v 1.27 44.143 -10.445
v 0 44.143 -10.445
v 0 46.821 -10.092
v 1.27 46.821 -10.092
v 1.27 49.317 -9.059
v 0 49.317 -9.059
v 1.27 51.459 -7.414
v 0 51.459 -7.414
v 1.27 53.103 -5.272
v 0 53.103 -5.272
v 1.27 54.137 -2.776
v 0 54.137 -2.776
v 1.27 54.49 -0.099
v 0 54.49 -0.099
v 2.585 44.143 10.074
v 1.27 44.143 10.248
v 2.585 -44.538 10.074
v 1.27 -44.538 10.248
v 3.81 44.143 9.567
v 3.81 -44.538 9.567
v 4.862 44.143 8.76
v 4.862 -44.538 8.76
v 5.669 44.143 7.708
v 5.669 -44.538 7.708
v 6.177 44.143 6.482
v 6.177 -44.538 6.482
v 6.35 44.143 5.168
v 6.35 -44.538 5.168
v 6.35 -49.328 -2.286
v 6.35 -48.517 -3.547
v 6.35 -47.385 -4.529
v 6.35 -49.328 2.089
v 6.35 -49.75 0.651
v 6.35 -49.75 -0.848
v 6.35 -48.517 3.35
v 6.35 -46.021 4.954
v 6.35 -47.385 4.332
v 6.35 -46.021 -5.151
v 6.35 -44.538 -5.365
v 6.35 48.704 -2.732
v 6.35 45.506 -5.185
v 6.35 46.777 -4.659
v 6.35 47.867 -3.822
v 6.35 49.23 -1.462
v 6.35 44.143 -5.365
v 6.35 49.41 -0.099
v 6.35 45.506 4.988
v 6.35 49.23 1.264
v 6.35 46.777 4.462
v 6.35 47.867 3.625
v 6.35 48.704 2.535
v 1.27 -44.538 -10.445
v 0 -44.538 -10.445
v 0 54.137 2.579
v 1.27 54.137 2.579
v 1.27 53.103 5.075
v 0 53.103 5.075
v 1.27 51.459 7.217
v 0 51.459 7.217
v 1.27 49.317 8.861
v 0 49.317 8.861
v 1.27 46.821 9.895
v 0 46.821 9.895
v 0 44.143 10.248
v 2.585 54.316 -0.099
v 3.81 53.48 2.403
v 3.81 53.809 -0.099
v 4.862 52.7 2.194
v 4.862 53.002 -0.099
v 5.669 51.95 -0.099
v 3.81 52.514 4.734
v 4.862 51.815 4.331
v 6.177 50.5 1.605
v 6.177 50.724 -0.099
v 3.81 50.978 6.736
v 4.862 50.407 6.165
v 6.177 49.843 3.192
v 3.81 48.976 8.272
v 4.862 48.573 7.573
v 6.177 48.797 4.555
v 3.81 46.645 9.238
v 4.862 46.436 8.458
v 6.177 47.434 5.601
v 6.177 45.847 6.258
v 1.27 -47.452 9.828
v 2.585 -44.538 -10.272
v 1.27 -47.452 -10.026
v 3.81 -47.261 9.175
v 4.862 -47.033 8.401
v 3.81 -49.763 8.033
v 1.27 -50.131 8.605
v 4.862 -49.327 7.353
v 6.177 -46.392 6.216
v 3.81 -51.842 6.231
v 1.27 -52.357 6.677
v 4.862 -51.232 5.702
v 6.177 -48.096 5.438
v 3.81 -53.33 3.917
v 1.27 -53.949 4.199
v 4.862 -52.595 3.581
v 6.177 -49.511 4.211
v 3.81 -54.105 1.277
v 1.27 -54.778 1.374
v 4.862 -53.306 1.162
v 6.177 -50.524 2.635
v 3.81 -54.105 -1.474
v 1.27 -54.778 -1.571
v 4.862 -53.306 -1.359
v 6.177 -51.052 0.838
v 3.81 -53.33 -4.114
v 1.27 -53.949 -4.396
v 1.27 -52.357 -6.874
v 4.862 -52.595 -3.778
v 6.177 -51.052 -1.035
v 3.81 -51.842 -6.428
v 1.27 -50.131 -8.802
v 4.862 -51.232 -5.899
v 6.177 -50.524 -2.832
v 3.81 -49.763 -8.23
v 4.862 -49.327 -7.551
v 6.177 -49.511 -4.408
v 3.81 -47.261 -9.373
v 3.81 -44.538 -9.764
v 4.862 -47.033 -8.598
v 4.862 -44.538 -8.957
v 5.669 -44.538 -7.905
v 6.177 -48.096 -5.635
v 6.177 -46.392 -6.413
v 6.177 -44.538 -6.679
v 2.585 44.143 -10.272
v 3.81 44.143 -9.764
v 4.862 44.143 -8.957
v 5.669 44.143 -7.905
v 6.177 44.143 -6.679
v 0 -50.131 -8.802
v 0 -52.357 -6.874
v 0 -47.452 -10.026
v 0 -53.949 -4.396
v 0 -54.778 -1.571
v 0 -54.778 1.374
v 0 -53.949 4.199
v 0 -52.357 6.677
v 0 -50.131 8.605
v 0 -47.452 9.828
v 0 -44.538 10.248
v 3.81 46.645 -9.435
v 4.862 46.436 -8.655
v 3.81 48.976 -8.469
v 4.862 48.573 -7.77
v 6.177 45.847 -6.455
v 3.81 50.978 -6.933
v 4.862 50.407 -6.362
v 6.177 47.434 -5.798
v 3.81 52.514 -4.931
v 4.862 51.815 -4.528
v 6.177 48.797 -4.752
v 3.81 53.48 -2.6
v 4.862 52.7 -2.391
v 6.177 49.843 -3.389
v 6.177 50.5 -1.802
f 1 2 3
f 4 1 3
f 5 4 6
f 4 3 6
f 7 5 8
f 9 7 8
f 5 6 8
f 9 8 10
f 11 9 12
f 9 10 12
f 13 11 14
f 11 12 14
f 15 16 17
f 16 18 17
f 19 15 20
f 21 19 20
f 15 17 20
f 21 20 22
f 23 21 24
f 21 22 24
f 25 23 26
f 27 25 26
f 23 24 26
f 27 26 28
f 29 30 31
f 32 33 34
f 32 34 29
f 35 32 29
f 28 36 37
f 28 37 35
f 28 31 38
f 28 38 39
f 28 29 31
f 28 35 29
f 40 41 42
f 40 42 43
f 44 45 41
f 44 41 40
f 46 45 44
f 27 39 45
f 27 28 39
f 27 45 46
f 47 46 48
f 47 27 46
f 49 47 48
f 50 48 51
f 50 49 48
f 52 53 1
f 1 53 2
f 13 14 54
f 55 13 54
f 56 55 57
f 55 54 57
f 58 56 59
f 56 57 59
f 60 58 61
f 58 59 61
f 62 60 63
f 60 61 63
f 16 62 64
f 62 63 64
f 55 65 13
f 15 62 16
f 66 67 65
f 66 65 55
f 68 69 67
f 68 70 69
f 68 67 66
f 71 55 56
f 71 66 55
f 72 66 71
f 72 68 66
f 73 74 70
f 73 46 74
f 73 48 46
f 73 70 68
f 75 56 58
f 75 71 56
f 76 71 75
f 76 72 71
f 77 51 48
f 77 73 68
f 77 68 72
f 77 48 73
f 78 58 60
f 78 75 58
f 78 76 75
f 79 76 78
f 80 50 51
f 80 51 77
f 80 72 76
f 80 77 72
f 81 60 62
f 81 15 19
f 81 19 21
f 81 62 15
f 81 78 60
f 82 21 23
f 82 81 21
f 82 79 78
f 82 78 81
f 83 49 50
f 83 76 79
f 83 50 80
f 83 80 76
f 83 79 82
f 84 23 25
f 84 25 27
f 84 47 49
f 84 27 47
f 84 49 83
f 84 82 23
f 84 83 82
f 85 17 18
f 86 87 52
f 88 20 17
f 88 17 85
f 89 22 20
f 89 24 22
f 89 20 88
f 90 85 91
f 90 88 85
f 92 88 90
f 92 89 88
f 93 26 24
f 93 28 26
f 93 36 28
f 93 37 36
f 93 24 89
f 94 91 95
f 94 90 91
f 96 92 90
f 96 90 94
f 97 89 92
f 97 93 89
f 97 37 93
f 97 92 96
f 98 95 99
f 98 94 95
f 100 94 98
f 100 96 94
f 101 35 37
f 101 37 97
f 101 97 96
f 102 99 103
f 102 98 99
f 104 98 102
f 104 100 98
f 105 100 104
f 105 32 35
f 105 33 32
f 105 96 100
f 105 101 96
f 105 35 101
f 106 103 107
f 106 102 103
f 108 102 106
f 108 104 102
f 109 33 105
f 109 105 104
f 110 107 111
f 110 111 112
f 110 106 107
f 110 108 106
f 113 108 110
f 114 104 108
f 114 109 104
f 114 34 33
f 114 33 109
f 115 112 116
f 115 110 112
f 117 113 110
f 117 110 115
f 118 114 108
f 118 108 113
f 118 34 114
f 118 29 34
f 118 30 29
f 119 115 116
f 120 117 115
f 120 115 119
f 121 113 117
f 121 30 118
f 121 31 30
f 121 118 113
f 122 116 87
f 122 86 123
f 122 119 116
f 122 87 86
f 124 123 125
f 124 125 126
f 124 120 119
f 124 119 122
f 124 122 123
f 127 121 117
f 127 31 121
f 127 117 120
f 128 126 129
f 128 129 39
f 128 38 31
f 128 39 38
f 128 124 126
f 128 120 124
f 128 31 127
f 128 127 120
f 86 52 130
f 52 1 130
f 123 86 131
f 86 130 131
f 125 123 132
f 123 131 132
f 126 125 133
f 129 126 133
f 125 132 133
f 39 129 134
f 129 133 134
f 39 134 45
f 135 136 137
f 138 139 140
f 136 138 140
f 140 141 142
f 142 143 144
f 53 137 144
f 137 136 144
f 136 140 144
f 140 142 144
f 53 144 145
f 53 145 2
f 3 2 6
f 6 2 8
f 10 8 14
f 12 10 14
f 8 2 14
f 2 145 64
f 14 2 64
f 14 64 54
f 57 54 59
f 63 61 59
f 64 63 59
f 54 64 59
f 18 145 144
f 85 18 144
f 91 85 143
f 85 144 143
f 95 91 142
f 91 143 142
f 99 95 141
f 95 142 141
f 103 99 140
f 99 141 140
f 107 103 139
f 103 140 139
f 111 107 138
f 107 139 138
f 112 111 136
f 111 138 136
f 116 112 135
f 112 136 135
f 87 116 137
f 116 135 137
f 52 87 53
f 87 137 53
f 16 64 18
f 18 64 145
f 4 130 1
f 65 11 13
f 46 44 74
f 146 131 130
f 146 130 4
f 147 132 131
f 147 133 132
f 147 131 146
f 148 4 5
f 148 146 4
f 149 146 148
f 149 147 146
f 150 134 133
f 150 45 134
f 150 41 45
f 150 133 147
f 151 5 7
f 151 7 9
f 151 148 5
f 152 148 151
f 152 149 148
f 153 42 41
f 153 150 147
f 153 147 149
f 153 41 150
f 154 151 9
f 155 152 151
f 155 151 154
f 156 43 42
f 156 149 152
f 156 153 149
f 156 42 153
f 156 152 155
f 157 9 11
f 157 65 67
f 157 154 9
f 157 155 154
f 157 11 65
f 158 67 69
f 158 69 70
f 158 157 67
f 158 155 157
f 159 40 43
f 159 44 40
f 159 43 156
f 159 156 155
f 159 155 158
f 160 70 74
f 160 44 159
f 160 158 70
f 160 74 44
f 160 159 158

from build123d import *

# Parameters (mm, degrees)
F1_DEPTH = 6.35
F2_R     = 5.08


with BuildPart() as f1:
    # F0 (on Right) → F1 (new body)
    with BuildSketch(Plane.YZ):
        with BuildLine():
            Line((-44.537589, -10.444656), (-44.537589, 10.247586))
            ThreePointArc((-44.537589, 10.247586), (-54.88371, -0.098535), (-44.537589, -10.444656))
        make_face()
        with BuildLine():
            ThreePointArc((-34.191468, -0.098535), (-37.221777, 7.217278), (-44.537589, 10.247586))
            Line((-44.537589, 10.247586), (-44.537589, -10.444656))
            ThreePointArc((-44.537589, -10.444656), (-37.221777, -7.414347), (-34.191468, -0.098535))
        make_face()
        with BuildLine():
            ThreePointArc((54.489574, -0.098535), (51.459266, 7.217278), (44.143453, 10.247586))
            Line((44.143453, 10.247586), (44.143453, -10.444656))
            ThreePointArc((44.143453, -10.444656), (51.459266, -7.414347), (54.489574, -0.098535))
        make_face()
        with BuildLine():
            Line((44.143453, -10.444656), (44.143453, 10.247586))
            ThreePointArc((44.143453, 10.247586), (33.797332, -0.098535), (44.143453, -10.444656))
        make_face()
        with BuildLine():
            Line((44.143453, 10.247586), (-44.537589, 10.247586))
            ThreePointArc((-44.537589, 10.247586), (-37.221777, 7.217278), (-34.191468, -0.098535))
            ThreePointArc((-34.191468, -0.098535), (-37.221777, -7.414347), (-44.537589, -10.444656))
            Line((-44.537589, -10.444656), (44.143453, -10.444656))
            ThreePointArc((44.143453, -10.444656), (33.797332, -0.098535), (44.143453, 10.247586))
        make_face()
    extrude(amount=F1_DEPTH)

    # F2
    f2_edges = [f1.edges().sort_by_distance(p)[0] for p in [
        (6.35, 54.489574, -0.098535),
        (6.35, -0.197068, 10.247586),
        (6.35, -54.88371, -0.098535),
        (6.35, -0.197068, -10.444656),
    ]]
    fillet(f2_edges, radius=F2_R)


solid = f1.part
